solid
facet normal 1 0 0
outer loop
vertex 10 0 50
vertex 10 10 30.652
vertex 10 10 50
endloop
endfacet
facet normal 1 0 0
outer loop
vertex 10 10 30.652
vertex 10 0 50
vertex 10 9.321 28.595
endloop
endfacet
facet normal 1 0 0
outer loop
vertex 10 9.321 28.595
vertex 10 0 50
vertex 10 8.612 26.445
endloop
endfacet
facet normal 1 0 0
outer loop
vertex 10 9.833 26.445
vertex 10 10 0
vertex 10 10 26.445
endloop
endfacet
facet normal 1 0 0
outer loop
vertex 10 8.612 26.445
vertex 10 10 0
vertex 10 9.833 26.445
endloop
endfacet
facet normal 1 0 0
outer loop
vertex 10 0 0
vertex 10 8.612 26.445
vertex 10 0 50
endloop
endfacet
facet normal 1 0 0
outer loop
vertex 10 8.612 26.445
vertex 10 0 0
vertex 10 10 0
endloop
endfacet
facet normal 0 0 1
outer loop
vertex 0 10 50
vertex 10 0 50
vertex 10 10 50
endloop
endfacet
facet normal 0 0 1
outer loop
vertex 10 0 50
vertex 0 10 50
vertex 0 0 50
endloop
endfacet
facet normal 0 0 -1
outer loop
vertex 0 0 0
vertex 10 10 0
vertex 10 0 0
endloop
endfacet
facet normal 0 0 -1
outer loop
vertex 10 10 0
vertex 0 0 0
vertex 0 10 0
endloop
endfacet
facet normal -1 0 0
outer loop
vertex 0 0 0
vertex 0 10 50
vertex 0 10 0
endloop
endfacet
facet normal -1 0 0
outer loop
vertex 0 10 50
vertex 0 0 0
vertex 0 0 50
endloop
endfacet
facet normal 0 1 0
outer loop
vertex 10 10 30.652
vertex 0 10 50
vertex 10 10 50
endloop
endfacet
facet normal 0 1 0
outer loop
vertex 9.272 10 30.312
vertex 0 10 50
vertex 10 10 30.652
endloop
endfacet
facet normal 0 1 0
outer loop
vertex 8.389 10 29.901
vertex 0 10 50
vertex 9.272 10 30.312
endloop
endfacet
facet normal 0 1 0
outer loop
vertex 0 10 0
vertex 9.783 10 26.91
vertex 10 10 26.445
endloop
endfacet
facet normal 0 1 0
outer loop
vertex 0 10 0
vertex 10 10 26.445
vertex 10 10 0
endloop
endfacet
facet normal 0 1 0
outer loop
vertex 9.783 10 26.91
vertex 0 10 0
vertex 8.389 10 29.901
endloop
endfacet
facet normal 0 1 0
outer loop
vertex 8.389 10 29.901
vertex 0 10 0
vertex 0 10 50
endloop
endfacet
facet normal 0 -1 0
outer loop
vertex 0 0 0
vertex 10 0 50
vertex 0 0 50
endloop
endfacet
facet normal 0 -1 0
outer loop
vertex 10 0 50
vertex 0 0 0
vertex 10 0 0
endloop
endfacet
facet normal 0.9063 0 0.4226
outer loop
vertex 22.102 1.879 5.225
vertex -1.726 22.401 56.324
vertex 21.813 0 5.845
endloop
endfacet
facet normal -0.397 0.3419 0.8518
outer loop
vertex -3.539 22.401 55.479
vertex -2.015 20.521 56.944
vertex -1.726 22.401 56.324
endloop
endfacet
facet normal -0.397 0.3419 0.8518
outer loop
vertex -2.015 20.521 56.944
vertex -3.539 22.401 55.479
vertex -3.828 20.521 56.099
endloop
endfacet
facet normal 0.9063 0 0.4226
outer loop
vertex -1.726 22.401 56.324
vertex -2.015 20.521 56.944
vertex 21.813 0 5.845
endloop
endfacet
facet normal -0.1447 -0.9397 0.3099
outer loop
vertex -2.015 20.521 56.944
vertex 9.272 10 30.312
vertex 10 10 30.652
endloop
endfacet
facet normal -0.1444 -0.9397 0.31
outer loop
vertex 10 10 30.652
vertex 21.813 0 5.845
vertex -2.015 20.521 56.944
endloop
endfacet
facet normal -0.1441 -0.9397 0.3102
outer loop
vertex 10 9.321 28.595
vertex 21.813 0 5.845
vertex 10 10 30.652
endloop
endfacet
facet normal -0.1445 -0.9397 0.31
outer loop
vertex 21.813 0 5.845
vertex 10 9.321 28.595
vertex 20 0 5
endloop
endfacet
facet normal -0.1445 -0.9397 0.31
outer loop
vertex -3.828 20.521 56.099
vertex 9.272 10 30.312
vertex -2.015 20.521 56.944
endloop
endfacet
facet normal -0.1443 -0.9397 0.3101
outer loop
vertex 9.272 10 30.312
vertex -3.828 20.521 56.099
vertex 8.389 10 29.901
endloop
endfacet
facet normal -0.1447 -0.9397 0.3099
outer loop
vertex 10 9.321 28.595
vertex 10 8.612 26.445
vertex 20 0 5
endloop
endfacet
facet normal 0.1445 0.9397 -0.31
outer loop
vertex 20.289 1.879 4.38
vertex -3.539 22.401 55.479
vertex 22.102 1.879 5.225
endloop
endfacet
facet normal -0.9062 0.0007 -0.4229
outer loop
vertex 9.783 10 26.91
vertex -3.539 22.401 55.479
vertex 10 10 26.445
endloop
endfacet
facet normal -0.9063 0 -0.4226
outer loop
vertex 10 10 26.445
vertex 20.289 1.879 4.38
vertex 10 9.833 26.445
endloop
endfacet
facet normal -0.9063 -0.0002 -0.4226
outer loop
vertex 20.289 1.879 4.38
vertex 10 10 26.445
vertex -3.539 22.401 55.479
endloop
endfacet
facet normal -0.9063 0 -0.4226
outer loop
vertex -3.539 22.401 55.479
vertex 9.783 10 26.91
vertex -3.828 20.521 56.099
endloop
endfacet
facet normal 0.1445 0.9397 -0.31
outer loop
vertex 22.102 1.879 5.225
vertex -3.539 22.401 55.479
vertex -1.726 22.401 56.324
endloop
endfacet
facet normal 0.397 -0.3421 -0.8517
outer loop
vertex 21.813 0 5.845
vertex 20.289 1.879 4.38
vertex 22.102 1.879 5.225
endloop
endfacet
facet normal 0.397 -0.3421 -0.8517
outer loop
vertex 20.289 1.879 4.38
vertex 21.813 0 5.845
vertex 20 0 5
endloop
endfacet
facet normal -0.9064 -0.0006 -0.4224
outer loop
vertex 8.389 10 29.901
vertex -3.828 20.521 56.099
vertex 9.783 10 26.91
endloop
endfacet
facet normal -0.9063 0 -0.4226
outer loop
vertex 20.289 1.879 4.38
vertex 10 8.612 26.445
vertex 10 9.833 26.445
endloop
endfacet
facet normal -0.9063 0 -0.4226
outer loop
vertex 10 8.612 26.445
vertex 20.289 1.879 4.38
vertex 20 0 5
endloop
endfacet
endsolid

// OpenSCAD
cube([10, 10, 50]);
translate([20, 0, 5]) {
	rotate([-20, -25, 0]) {
		cube([2, 2, 60]);
	}
}
